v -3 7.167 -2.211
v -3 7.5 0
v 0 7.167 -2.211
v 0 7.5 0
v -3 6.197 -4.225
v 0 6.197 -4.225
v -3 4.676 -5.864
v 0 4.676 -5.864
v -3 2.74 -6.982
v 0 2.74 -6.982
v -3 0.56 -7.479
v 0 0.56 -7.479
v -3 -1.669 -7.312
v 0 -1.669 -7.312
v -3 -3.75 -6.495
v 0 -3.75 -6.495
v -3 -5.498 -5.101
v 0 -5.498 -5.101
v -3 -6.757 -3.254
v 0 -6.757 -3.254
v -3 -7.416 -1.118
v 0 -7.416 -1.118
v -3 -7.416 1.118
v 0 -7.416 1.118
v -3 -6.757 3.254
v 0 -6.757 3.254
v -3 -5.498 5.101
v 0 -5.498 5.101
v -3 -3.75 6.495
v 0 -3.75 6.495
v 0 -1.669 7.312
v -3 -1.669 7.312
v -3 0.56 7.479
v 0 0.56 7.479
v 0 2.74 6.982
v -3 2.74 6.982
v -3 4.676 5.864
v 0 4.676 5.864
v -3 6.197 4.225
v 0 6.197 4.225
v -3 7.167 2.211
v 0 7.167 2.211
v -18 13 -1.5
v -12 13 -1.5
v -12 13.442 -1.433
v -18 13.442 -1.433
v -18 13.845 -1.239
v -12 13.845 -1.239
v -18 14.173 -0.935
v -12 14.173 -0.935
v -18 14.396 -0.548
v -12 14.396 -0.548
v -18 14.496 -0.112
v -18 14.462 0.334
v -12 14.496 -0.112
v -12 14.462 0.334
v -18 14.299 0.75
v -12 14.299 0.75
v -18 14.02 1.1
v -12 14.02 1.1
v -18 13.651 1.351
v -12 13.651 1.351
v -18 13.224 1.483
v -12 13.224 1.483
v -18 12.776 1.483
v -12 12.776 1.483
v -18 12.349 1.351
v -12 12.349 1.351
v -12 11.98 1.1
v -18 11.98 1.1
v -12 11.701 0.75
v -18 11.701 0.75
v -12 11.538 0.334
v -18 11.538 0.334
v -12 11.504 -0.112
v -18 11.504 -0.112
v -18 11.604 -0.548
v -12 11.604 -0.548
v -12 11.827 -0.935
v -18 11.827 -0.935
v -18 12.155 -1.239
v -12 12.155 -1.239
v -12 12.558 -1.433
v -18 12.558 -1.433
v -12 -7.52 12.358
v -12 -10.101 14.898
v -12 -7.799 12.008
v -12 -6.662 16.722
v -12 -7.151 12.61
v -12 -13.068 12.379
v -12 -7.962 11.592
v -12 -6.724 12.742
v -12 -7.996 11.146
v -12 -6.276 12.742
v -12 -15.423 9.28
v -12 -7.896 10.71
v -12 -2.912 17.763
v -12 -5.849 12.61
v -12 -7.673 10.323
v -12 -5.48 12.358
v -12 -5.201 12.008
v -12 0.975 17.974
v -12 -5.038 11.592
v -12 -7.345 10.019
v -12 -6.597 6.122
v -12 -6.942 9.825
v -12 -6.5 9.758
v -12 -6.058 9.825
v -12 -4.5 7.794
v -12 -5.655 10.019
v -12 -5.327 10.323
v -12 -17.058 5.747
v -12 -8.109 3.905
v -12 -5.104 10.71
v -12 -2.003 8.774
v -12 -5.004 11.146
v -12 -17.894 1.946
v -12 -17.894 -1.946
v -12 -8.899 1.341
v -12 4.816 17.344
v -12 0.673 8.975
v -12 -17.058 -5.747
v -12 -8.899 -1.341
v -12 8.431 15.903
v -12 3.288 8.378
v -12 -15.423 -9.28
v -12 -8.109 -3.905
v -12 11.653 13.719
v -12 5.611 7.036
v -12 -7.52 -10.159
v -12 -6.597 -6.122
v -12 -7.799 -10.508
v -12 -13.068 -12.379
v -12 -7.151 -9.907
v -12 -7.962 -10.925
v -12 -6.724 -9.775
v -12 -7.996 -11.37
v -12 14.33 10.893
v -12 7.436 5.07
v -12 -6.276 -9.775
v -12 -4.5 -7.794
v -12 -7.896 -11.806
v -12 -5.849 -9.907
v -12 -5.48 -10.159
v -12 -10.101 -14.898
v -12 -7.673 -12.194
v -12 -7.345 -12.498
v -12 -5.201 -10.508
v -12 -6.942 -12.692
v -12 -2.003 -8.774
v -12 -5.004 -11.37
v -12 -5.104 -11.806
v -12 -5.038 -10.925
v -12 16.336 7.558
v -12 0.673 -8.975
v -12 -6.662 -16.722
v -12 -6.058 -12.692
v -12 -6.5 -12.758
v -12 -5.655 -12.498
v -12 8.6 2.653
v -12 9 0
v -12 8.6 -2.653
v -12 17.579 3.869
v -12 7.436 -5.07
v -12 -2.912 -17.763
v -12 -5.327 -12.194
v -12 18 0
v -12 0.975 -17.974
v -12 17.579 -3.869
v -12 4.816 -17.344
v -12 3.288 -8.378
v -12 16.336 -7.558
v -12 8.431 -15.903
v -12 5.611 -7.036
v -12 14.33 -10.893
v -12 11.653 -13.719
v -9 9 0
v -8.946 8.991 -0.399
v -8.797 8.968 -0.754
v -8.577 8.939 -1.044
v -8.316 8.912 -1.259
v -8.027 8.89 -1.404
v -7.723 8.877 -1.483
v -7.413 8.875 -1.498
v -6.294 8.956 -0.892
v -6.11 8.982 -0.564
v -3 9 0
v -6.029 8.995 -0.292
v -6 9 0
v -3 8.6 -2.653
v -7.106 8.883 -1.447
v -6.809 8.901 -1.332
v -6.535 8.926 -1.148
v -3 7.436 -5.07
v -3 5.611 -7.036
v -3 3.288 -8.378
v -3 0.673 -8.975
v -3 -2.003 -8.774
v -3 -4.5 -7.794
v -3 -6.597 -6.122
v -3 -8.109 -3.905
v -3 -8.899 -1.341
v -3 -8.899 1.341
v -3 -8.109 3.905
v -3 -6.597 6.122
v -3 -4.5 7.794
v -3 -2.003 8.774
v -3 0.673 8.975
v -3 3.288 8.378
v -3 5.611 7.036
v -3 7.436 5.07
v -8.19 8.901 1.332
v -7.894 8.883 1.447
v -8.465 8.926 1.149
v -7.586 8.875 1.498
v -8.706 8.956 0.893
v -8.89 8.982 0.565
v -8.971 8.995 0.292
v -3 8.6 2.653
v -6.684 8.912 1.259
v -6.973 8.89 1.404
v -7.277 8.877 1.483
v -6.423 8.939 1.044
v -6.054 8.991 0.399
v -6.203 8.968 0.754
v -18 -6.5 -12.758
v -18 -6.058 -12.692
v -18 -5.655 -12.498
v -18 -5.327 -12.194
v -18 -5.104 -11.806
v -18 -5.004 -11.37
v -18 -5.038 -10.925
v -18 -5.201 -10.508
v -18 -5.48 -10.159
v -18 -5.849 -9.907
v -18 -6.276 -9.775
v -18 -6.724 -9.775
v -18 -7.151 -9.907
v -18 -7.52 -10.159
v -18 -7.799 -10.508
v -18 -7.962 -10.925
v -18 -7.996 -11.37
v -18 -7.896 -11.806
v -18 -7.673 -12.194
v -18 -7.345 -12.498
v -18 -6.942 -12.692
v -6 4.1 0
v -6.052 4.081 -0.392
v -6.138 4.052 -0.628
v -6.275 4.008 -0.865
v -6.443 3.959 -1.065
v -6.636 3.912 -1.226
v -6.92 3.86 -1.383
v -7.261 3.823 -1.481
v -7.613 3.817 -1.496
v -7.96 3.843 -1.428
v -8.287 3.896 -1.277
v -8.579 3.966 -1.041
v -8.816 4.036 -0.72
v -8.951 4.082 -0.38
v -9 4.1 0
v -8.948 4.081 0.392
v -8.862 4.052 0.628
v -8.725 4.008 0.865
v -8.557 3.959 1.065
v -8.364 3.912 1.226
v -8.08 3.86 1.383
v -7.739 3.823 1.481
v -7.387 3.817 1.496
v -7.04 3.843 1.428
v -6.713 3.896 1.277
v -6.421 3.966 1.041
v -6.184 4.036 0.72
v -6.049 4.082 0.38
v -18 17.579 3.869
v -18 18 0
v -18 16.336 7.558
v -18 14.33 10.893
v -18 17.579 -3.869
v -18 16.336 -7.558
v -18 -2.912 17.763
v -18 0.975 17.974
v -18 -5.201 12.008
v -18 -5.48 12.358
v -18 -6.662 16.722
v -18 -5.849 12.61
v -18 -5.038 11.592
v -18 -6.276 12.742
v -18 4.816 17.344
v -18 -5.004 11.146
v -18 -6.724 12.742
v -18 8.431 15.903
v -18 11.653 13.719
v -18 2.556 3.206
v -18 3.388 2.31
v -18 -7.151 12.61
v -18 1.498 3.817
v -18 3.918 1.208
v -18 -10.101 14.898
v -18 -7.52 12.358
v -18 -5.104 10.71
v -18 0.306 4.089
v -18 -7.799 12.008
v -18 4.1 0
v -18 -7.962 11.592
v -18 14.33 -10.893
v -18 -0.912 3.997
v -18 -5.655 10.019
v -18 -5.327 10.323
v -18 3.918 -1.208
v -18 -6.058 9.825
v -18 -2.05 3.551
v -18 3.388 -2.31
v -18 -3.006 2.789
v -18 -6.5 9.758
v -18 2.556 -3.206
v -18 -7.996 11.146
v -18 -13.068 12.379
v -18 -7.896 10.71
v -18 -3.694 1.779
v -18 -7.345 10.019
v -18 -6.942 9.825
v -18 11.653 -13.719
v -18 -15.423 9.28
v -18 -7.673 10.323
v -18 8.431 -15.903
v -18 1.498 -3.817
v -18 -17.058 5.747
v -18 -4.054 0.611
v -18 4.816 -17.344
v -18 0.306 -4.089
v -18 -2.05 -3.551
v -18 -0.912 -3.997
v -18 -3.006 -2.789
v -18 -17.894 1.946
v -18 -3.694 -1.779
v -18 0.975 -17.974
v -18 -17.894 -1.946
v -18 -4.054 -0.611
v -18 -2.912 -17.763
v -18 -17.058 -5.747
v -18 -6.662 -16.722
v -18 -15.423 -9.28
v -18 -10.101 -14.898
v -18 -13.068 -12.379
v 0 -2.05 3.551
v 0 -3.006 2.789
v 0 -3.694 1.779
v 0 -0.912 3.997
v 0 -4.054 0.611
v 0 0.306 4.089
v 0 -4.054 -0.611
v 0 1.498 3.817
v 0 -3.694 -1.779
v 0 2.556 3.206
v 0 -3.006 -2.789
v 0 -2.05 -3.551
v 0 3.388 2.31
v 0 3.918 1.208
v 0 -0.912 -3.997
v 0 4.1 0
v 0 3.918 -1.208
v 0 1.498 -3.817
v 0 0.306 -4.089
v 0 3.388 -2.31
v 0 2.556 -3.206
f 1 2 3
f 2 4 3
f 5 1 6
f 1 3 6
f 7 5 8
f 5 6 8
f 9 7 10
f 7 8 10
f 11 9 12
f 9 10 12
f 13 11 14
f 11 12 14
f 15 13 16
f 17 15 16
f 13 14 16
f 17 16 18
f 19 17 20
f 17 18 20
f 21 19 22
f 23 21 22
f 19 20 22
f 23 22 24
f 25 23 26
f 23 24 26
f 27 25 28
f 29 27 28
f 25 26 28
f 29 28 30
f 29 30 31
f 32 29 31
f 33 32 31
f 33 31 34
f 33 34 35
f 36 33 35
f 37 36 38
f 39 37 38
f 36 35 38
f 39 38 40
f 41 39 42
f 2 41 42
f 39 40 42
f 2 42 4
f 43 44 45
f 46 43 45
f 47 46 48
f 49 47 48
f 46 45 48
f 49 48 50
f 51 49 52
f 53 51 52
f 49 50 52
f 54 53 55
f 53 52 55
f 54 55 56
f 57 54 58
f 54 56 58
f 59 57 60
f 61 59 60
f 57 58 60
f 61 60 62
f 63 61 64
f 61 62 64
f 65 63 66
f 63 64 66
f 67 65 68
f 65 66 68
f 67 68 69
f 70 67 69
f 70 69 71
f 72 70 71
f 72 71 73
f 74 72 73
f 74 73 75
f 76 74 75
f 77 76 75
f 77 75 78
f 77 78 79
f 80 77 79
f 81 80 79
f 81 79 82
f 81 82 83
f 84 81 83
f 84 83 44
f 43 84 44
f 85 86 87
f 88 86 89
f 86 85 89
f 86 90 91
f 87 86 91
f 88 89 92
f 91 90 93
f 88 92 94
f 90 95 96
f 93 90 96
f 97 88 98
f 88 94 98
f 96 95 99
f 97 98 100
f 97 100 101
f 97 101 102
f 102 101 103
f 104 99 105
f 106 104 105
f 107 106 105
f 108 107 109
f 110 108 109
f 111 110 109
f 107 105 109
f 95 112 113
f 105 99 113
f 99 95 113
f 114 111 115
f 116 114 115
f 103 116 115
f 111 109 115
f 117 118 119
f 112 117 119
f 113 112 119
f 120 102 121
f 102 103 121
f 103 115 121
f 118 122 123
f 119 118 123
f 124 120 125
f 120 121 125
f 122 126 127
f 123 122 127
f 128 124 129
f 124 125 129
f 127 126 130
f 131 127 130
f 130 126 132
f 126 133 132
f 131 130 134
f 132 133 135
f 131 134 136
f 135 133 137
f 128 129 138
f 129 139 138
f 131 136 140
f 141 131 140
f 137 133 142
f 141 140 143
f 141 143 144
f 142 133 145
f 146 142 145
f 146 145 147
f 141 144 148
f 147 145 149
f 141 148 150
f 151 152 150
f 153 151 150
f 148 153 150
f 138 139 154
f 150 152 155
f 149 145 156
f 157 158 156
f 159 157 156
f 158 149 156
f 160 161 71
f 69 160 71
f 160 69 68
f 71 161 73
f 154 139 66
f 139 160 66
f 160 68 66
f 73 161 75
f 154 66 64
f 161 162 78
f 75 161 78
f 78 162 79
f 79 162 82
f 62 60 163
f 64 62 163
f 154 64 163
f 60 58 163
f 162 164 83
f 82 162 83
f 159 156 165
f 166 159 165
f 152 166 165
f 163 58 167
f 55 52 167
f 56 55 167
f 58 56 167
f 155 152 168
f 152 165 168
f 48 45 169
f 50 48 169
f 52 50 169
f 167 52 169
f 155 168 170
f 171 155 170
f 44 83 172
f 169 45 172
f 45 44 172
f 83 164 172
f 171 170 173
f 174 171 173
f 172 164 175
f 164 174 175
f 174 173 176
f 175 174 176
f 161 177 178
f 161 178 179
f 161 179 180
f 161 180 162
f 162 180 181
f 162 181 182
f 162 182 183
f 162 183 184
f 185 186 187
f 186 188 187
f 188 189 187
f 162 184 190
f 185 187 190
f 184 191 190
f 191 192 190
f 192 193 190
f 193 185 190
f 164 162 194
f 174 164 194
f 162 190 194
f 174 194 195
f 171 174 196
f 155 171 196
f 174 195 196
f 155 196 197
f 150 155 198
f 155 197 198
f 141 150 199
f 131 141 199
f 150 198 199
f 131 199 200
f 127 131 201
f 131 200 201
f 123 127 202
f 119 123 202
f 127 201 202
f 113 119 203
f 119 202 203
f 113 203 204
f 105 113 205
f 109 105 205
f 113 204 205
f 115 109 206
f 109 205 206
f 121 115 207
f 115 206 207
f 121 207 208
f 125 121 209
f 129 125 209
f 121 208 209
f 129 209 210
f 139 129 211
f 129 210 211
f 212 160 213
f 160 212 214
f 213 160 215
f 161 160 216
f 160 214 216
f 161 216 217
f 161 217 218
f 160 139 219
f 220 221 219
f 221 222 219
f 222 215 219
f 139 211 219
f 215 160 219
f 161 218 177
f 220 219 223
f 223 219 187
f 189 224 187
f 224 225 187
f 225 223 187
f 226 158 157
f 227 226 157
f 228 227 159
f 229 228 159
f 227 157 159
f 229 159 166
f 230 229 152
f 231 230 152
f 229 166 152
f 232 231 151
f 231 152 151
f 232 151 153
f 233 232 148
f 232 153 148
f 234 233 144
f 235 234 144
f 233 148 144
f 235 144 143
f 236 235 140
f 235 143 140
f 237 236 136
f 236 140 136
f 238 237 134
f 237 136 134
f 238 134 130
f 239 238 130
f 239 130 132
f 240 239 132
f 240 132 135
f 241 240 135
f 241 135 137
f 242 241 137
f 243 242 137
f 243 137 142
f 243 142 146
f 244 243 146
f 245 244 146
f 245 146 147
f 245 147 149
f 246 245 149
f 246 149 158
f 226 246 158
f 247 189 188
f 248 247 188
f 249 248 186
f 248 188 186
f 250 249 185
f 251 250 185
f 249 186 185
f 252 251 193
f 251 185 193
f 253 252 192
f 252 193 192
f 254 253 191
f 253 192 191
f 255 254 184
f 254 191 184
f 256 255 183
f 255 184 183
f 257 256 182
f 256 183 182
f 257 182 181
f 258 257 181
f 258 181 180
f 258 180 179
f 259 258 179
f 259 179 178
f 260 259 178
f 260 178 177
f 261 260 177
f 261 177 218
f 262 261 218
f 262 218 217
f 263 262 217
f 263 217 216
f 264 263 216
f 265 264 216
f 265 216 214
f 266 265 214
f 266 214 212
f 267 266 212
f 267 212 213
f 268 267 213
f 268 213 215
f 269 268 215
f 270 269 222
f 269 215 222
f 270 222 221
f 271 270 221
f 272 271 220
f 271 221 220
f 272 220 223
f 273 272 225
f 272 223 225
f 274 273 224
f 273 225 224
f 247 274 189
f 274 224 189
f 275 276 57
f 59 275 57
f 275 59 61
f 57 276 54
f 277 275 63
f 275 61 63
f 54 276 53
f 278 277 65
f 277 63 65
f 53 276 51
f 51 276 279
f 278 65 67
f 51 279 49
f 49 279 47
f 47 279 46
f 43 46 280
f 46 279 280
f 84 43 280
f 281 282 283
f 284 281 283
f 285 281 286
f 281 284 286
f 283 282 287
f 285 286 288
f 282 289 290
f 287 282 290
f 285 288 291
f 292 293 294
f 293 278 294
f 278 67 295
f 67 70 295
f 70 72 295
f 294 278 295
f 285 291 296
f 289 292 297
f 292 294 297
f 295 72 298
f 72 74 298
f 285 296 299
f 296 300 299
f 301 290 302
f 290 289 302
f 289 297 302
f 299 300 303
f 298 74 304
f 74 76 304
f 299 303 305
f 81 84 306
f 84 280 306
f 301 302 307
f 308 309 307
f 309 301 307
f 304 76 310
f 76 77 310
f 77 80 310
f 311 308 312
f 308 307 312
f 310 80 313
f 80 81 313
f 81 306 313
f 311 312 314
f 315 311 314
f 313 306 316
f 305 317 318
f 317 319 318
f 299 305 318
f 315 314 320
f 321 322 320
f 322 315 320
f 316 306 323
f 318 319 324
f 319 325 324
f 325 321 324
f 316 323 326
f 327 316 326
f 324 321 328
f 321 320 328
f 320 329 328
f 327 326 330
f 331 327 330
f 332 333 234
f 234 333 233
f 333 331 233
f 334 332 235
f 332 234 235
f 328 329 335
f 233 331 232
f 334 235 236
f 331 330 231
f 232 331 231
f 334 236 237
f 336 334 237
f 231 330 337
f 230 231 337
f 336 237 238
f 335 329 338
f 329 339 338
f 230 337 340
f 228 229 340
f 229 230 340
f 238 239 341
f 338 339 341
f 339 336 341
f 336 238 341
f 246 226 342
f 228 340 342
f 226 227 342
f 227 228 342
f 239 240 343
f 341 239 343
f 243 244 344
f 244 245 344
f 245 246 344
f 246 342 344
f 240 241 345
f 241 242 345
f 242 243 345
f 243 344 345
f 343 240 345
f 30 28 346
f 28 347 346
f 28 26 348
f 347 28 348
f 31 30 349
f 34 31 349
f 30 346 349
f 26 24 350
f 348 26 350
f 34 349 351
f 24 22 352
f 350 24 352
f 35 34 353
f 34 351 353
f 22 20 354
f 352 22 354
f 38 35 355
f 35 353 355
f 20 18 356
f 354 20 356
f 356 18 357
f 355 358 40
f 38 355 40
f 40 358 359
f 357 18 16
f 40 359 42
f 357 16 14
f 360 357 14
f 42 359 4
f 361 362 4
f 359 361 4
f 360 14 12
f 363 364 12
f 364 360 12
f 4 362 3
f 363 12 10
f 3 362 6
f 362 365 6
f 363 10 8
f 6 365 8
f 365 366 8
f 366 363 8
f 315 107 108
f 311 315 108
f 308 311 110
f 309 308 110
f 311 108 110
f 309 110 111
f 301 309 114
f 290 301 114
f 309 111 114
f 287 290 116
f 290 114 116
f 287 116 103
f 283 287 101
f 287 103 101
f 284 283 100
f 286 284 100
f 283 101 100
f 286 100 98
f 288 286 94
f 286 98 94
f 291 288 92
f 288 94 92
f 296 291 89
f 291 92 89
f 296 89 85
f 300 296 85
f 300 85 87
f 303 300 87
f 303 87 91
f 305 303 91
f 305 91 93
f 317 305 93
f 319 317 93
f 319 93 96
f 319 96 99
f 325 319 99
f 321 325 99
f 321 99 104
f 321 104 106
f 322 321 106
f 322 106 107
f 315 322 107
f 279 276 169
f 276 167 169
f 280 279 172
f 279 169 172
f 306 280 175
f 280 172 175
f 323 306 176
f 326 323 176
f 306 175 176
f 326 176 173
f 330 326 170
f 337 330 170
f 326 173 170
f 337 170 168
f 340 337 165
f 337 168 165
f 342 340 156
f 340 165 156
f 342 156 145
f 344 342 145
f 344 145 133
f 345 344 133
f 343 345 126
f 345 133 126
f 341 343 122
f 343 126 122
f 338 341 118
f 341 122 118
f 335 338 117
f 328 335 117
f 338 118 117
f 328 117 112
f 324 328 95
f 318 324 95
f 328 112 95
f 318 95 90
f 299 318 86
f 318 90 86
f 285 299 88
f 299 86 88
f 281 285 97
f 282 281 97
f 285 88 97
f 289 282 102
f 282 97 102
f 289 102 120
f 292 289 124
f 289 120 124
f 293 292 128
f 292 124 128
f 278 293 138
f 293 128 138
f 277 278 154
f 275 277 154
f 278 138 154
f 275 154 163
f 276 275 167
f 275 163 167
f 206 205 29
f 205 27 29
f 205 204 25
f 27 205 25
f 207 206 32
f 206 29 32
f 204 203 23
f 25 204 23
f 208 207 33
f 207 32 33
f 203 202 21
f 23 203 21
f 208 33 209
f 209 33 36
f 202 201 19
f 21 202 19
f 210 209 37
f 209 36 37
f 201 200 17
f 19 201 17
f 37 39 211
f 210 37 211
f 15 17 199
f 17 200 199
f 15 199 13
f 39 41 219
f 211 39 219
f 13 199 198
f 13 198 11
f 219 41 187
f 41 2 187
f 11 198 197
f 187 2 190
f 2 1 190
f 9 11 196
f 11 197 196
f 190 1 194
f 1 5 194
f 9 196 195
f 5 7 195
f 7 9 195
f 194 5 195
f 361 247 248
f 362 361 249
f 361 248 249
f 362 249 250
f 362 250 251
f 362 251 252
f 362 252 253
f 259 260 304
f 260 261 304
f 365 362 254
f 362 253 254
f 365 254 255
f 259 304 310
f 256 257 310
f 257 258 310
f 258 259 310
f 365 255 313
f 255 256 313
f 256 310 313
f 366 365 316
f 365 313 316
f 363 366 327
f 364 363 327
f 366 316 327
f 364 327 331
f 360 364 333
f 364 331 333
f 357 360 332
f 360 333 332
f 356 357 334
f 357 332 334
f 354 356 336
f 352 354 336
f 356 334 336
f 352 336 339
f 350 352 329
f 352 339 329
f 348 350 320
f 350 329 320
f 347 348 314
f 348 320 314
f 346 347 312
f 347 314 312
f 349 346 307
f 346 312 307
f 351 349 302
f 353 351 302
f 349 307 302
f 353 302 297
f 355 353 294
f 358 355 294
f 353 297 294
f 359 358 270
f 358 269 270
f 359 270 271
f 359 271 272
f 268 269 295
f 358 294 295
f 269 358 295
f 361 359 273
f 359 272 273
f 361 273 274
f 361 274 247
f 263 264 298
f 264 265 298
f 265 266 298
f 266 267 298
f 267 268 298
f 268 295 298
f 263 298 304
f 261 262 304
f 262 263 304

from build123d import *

# Parameters (mm, degrees)
ESQUISSE2_R             = 1.5
ENL_V_MAT_EXTRU_1_DEPTH = 7
ENL_V_MAT_EXTRU_2_REACH = 29
ESQUISSE3_R             = 1.5


with BuildPart() as part:
    # Esquisse1 → Révolution1 (revolve)
    with BuildSketch(Plane.XY):
        Polygon((0, 4.1), (-18, 4.1), (-18, 18), (-12, 18), (-12, 9), (-3, 9), (-3, 7.5), (0, 7.5), align=None)
    revolve(axis=Axis((0, 0, 0), (-1, 0, 0)))

    # Esquisse2 → Enlèv. mat.-Extru.1 (cut, through all)
    with BuildSketch(Plane(origin=(-12, 0, 0), x_dir=(0, 0, -1), z_dir=(1, 0, 0))):
        with Locations((0, 13)):
            Circle(ESQUISSE2_R)
        with Locations((11.258330249, -6.5)):
            Circle(ESQUISSE2_R)
        with Locations((-11.258330249, -6.5)):
            Circle(ESQUISSE2_R)
    extrude(amount=-ENL_V_MAT_EXTRU_1_DEPTH, mode=Mode.SUBTRACT)

    # Esquisse3 → Enlèv. mat.-Extru.2 (cut, up to next)
    with BuildSketch(Plane(origin=(0, 9, 0), x_dir=(1, 0, 0), z_dir=(0, 1, 0)), mode=Mode.PRIVATE) as enl_v_mat_extru_2_sk1:
        with Locations((-7.5, 0)):
            Circle(ESQUISSE3_R)
    enl_v_mat_extru_2_tool1 = extrude(enl_v_mat_extru_2_sk1.sketch, amount=-ENL_V_MAT_EXTRU_2_REACH, mode=Mode.PRIVATE) & part.part
    add(enl_v_mat_extru_2_tool1.solids().sort_by_distance((-7.5, 9, 0))[0], mode=Mode.SUBTRACT)


solid = part.part
